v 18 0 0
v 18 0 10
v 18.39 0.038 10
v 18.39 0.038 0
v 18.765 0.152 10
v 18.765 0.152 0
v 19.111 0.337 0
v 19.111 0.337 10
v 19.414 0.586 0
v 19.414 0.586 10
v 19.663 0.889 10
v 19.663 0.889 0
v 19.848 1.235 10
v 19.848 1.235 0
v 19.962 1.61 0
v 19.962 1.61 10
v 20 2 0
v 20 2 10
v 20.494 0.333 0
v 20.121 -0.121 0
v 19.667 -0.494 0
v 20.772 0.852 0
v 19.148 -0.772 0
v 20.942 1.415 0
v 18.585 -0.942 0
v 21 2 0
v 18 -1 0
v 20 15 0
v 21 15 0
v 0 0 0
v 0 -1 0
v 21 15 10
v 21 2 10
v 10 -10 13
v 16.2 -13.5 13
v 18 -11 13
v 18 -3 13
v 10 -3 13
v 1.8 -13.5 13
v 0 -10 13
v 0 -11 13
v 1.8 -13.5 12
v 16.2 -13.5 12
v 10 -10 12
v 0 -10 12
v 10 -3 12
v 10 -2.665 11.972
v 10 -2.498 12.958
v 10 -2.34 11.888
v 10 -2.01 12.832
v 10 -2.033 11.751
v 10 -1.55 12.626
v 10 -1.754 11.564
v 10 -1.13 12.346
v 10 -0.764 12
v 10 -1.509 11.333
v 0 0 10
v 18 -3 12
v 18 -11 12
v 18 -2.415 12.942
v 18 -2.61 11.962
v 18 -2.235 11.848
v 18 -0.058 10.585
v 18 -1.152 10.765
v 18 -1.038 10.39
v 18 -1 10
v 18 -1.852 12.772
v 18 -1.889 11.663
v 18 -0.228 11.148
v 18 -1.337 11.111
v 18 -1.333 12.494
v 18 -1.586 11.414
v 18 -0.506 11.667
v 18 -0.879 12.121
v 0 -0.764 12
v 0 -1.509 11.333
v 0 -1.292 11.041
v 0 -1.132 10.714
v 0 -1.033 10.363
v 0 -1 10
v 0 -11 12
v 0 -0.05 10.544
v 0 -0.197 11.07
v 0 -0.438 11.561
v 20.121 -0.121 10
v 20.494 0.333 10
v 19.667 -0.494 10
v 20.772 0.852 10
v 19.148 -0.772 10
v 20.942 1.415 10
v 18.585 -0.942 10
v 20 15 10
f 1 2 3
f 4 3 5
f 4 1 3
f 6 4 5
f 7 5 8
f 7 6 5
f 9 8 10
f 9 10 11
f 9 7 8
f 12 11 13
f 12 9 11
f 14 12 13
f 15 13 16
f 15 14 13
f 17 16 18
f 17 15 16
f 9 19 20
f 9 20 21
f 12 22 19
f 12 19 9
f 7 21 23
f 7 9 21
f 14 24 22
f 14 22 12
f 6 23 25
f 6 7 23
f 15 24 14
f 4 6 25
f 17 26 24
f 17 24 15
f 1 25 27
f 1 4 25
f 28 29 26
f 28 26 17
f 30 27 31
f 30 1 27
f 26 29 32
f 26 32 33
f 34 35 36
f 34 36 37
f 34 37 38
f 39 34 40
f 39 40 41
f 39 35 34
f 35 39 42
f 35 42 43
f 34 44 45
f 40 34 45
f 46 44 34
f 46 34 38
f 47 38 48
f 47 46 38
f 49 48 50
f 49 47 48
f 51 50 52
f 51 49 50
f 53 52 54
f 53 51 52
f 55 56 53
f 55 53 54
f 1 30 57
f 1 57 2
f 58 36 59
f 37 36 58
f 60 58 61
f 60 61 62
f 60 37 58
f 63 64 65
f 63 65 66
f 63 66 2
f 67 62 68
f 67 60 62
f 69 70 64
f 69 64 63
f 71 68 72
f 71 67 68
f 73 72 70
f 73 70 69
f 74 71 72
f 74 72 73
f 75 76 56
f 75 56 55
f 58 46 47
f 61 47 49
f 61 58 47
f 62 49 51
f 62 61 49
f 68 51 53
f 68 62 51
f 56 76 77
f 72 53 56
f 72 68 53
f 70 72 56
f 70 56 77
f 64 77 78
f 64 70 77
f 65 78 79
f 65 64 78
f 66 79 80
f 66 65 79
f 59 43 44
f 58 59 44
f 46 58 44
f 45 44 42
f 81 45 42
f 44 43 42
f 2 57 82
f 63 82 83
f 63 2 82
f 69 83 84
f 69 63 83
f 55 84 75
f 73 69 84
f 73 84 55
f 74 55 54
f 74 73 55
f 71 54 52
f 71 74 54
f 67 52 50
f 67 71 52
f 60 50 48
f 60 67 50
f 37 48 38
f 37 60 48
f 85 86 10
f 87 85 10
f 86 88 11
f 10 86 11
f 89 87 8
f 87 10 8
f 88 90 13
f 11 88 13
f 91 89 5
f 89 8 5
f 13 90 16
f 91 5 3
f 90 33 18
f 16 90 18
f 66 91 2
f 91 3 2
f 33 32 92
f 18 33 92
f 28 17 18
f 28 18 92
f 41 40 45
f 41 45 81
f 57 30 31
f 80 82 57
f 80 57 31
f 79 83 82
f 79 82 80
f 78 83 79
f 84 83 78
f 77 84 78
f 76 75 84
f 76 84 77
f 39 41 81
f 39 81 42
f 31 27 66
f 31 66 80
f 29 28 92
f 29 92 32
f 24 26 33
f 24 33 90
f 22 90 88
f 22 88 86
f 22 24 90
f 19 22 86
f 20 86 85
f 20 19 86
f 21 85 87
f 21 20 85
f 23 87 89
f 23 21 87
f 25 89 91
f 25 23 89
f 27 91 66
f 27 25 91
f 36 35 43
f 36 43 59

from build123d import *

# Parameters (mm, degrees)
SM_BASE_FLANGE_1_DEPTH      = 10
SM_EDGE_FLANGE_2_DEPTH      = 18
SM_START                    = 1
SM_EDGE_FLANGE_2_FLAT_DEPTH = 1
SKETCH_10_W                 = 40
SKETCH_10_H                 = 40
CUT_EXTRUDE_1_DEPTH         = 29.460498942
SMNORMALCUT_DEPTH           = 10


# Read off the part's stored shape, not the designer's step: SMNormalCut
# Sheet-metal steps are written as plain solids
with BuildPart() as part:
    # Sketch 1 → 基体-法兰1 (new body)
    with BuildSketch(Plane.XY):
        with BuildLine():
            Line((0, 0), (18, 0))
            ThreePointArc((18, 0), (19.414213562, 0.585786438), (20, 2))
            Line((20, 2), (20, 15))
            Line((20, 15), (21, 15))
            Line((21, 15), (21, 2))
            ThreePointArc((21, 2), (20.121320344, -0.121320344), (18, -1))
            Line((18, -1), (0, -1))
            Line((0, -1), (0, 0))
        make_face()
    extrude(amount=SM_BASE_FLANGE_1_DEPTH)

    # 边线-法兰2 bend section (across the edge) → 边线-法兰2 (add)
    with BuildSketch(Plane(origin=(18, -1, 12), x_dir=(0, 0, -1), z_dir=(-1, 0, 0))):
        with BuildLine():
            Line((-1, 2), (0, 2))
            ThreePointArc((0, 2), (0.585786438, 0.585786438), (2, 0))
            Line((2, 0), (2, -1))
            ThreePointArc((2, -1), (-0.121320344, -0.121320344), (-1, 2))
        make_face()
    extrude(amount=SM_EDGE_FLANGE_2_DEPTH)

    # 边线-法兰2 profile (on flange) → 边线-法兰2 flat (add)
    with BuildSketch(Plane(origin=(0, -1, 12), x_dir=(-1, 0, 0), z_dir=(0, 0, 1)).offset(SM_START)):
        Polygon((0, 2), (0, 10), (-1.8, 12.5), (-16.2, 12.5), (-18, 10), (-18, 2), align=None)
    extrude(amount=-SM_EDGE_FLANGE_2_FLAT_DEPTH)

    # 草图10 → 切除-拉伸1 (cut, through all)
    with BuildSketch(Plane(origin=(0, 0, 12), x_dir=(-1, 0, 0), z_dir=(0, 0, -1))):
        with Locations((10, 10)):
            Rectangle(SKETCH_10_W, SKETCH_10_H)
    extrude(amount=-CUT_EXTRUDE_1_DEPTH, mode=Mode.SUBTRACT)

    # SMNormalCut outline → SMNormalCut (cut)
    with BuildSketch(Plane.YZ):
        with BuildLine():
            ThreePointArc((-3, 12), (-2.183503419, 11.825741858), (-1.509288015, 11.333333333))
            Line((-1.509288015, 11.333333333), (-0.763932023, 12))
            Line((-0.763932023, 12), (-3, 12))
        make_face()
    extrude(amount=SMNORMALCUT_DEPTH, mode=Mode.SUBTRACT)


solid = part.part
